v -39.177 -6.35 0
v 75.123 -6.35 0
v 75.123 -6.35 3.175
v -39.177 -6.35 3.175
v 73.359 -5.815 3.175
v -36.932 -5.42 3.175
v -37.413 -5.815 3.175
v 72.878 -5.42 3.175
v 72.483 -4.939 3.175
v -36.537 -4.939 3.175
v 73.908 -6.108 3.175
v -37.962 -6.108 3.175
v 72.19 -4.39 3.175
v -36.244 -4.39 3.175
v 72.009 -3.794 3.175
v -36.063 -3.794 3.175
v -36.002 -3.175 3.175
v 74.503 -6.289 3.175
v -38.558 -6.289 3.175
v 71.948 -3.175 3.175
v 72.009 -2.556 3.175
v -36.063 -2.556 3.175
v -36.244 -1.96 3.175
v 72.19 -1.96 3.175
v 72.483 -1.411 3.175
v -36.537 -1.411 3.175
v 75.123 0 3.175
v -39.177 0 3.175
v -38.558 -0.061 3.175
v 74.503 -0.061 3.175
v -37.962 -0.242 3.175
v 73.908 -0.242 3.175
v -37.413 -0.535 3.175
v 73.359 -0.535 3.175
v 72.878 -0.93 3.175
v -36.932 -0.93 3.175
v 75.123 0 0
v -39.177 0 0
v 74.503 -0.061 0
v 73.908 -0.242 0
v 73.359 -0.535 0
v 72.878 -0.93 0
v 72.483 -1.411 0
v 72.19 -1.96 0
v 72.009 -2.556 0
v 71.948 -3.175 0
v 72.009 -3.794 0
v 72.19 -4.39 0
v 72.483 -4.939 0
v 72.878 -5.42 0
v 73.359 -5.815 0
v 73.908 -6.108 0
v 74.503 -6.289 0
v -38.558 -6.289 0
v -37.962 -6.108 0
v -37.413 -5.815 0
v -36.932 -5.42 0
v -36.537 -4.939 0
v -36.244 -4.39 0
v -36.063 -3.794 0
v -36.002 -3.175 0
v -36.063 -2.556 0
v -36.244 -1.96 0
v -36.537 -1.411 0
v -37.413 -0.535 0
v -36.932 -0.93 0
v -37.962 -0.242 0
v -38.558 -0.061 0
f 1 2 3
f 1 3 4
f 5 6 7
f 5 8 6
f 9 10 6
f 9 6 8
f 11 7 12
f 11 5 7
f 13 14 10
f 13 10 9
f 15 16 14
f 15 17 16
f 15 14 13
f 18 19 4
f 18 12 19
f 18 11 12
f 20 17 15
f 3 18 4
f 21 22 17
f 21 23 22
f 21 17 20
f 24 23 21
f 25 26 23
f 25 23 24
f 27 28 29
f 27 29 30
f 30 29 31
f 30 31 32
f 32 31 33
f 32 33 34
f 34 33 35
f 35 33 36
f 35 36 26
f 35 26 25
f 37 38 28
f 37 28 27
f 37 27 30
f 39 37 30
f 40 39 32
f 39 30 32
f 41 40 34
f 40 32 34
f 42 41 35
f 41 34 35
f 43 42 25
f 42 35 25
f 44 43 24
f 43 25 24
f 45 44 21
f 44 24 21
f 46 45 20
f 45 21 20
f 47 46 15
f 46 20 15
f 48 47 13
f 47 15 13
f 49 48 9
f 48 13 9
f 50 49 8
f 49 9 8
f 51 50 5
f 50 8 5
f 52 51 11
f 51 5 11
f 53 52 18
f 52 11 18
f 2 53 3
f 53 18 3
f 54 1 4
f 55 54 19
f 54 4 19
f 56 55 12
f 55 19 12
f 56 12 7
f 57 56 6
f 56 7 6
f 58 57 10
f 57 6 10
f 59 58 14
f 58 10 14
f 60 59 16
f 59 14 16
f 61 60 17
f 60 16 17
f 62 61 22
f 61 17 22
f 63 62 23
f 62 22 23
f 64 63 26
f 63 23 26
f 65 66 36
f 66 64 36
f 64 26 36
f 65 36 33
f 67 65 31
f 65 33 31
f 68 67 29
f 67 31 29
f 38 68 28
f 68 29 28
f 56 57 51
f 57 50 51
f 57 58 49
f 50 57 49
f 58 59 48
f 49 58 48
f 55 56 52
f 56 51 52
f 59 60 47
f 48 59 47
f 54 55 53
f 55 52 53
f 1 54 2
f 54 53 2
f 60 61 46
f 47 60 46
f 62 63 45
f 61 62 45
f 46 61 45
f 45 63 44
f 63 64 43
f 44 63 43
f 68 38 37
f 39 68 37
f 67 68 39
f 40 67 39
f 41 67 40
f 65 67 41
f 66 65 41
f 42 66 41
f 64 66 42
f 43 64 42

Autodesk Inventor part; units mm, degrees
ref_plane "YZ Plane" through (0, 0, 0) normal (1, 0, 0) x (0, 1, 0)
ref_plane "XZ Plane" through (0, 0, 0) normal (0, 1, 0) x (-1, 0, 0)
ref_plane "XY Plane" through (0, 0, 0) normal (0, 0, 1) x (1, 0, 0)
sketch "Sketch1" plane through (0, 0, 0) normal (0, 0, 1) x (1, 0, 0)
  line L0 (-39.1771, 0) -> (75.1229, 0)
  line L1 (75.1229, 0) -> (75.1229, -6.35)
  line L2 (75.1229, -6.35) -> (-39.1771, -6.35)
  line L3 (-39.1771, -6.35) -> (-39.1771, 0)
  point P0 (0, 0)
  dimension "d0" = 114.3
  dimension "d1" = 6.35
extrude "Extrusion1" add sketch "Sketch1" along normal blind 6.35
sketch "Sketch2" plane through (0, 0, 6.35) normal (0, 0, 1) x (1, 0, 0)
  line L0 (75.1229, 0) -> (75.1229, -6.35) projected
  line L1 (-39.1771, -6.35) -> (-39.1771, 0) projected
  line L2 (-39.1771, 0) -> (-39.1771, -3.175)
  line L3 (-39.1771, -3.175) -> (75.1229, -3.175)
  circle A0 centre (-39.1771, -3.175) radius 3.175
  circle A1 centre (75.1229, -3.175) radius 3.175
  point P0 (0, 0)
  dimension "d4" = 3.175
extrude "Extrusion2" cut sketch "Sketch2" against normal blind 6.35
sketch "Sketch3" plane through (0, 0, 6.35) normal (0, 0, 1) x (1, 0, 0)
  arc A0 (-39.1771, -6.35) -> (-39.1771, 0) centre (-39.1771, -3.175) ccw projected
  line L0 (75.1229, -6.35) -> (-39.1771, -6.35) projected
  arc A1 (75.1229, 0) -> (75.1229, -6.35) centre (75.1229, -3.175) ccw projected
  line L1 (-39.1771, 0) -> (75.1229, 0) projected
  point P0 (0, 0)
extrude "Extrusion3" cut sketch "Sketch3" against normal blind 3.175
properties part number "bar"
